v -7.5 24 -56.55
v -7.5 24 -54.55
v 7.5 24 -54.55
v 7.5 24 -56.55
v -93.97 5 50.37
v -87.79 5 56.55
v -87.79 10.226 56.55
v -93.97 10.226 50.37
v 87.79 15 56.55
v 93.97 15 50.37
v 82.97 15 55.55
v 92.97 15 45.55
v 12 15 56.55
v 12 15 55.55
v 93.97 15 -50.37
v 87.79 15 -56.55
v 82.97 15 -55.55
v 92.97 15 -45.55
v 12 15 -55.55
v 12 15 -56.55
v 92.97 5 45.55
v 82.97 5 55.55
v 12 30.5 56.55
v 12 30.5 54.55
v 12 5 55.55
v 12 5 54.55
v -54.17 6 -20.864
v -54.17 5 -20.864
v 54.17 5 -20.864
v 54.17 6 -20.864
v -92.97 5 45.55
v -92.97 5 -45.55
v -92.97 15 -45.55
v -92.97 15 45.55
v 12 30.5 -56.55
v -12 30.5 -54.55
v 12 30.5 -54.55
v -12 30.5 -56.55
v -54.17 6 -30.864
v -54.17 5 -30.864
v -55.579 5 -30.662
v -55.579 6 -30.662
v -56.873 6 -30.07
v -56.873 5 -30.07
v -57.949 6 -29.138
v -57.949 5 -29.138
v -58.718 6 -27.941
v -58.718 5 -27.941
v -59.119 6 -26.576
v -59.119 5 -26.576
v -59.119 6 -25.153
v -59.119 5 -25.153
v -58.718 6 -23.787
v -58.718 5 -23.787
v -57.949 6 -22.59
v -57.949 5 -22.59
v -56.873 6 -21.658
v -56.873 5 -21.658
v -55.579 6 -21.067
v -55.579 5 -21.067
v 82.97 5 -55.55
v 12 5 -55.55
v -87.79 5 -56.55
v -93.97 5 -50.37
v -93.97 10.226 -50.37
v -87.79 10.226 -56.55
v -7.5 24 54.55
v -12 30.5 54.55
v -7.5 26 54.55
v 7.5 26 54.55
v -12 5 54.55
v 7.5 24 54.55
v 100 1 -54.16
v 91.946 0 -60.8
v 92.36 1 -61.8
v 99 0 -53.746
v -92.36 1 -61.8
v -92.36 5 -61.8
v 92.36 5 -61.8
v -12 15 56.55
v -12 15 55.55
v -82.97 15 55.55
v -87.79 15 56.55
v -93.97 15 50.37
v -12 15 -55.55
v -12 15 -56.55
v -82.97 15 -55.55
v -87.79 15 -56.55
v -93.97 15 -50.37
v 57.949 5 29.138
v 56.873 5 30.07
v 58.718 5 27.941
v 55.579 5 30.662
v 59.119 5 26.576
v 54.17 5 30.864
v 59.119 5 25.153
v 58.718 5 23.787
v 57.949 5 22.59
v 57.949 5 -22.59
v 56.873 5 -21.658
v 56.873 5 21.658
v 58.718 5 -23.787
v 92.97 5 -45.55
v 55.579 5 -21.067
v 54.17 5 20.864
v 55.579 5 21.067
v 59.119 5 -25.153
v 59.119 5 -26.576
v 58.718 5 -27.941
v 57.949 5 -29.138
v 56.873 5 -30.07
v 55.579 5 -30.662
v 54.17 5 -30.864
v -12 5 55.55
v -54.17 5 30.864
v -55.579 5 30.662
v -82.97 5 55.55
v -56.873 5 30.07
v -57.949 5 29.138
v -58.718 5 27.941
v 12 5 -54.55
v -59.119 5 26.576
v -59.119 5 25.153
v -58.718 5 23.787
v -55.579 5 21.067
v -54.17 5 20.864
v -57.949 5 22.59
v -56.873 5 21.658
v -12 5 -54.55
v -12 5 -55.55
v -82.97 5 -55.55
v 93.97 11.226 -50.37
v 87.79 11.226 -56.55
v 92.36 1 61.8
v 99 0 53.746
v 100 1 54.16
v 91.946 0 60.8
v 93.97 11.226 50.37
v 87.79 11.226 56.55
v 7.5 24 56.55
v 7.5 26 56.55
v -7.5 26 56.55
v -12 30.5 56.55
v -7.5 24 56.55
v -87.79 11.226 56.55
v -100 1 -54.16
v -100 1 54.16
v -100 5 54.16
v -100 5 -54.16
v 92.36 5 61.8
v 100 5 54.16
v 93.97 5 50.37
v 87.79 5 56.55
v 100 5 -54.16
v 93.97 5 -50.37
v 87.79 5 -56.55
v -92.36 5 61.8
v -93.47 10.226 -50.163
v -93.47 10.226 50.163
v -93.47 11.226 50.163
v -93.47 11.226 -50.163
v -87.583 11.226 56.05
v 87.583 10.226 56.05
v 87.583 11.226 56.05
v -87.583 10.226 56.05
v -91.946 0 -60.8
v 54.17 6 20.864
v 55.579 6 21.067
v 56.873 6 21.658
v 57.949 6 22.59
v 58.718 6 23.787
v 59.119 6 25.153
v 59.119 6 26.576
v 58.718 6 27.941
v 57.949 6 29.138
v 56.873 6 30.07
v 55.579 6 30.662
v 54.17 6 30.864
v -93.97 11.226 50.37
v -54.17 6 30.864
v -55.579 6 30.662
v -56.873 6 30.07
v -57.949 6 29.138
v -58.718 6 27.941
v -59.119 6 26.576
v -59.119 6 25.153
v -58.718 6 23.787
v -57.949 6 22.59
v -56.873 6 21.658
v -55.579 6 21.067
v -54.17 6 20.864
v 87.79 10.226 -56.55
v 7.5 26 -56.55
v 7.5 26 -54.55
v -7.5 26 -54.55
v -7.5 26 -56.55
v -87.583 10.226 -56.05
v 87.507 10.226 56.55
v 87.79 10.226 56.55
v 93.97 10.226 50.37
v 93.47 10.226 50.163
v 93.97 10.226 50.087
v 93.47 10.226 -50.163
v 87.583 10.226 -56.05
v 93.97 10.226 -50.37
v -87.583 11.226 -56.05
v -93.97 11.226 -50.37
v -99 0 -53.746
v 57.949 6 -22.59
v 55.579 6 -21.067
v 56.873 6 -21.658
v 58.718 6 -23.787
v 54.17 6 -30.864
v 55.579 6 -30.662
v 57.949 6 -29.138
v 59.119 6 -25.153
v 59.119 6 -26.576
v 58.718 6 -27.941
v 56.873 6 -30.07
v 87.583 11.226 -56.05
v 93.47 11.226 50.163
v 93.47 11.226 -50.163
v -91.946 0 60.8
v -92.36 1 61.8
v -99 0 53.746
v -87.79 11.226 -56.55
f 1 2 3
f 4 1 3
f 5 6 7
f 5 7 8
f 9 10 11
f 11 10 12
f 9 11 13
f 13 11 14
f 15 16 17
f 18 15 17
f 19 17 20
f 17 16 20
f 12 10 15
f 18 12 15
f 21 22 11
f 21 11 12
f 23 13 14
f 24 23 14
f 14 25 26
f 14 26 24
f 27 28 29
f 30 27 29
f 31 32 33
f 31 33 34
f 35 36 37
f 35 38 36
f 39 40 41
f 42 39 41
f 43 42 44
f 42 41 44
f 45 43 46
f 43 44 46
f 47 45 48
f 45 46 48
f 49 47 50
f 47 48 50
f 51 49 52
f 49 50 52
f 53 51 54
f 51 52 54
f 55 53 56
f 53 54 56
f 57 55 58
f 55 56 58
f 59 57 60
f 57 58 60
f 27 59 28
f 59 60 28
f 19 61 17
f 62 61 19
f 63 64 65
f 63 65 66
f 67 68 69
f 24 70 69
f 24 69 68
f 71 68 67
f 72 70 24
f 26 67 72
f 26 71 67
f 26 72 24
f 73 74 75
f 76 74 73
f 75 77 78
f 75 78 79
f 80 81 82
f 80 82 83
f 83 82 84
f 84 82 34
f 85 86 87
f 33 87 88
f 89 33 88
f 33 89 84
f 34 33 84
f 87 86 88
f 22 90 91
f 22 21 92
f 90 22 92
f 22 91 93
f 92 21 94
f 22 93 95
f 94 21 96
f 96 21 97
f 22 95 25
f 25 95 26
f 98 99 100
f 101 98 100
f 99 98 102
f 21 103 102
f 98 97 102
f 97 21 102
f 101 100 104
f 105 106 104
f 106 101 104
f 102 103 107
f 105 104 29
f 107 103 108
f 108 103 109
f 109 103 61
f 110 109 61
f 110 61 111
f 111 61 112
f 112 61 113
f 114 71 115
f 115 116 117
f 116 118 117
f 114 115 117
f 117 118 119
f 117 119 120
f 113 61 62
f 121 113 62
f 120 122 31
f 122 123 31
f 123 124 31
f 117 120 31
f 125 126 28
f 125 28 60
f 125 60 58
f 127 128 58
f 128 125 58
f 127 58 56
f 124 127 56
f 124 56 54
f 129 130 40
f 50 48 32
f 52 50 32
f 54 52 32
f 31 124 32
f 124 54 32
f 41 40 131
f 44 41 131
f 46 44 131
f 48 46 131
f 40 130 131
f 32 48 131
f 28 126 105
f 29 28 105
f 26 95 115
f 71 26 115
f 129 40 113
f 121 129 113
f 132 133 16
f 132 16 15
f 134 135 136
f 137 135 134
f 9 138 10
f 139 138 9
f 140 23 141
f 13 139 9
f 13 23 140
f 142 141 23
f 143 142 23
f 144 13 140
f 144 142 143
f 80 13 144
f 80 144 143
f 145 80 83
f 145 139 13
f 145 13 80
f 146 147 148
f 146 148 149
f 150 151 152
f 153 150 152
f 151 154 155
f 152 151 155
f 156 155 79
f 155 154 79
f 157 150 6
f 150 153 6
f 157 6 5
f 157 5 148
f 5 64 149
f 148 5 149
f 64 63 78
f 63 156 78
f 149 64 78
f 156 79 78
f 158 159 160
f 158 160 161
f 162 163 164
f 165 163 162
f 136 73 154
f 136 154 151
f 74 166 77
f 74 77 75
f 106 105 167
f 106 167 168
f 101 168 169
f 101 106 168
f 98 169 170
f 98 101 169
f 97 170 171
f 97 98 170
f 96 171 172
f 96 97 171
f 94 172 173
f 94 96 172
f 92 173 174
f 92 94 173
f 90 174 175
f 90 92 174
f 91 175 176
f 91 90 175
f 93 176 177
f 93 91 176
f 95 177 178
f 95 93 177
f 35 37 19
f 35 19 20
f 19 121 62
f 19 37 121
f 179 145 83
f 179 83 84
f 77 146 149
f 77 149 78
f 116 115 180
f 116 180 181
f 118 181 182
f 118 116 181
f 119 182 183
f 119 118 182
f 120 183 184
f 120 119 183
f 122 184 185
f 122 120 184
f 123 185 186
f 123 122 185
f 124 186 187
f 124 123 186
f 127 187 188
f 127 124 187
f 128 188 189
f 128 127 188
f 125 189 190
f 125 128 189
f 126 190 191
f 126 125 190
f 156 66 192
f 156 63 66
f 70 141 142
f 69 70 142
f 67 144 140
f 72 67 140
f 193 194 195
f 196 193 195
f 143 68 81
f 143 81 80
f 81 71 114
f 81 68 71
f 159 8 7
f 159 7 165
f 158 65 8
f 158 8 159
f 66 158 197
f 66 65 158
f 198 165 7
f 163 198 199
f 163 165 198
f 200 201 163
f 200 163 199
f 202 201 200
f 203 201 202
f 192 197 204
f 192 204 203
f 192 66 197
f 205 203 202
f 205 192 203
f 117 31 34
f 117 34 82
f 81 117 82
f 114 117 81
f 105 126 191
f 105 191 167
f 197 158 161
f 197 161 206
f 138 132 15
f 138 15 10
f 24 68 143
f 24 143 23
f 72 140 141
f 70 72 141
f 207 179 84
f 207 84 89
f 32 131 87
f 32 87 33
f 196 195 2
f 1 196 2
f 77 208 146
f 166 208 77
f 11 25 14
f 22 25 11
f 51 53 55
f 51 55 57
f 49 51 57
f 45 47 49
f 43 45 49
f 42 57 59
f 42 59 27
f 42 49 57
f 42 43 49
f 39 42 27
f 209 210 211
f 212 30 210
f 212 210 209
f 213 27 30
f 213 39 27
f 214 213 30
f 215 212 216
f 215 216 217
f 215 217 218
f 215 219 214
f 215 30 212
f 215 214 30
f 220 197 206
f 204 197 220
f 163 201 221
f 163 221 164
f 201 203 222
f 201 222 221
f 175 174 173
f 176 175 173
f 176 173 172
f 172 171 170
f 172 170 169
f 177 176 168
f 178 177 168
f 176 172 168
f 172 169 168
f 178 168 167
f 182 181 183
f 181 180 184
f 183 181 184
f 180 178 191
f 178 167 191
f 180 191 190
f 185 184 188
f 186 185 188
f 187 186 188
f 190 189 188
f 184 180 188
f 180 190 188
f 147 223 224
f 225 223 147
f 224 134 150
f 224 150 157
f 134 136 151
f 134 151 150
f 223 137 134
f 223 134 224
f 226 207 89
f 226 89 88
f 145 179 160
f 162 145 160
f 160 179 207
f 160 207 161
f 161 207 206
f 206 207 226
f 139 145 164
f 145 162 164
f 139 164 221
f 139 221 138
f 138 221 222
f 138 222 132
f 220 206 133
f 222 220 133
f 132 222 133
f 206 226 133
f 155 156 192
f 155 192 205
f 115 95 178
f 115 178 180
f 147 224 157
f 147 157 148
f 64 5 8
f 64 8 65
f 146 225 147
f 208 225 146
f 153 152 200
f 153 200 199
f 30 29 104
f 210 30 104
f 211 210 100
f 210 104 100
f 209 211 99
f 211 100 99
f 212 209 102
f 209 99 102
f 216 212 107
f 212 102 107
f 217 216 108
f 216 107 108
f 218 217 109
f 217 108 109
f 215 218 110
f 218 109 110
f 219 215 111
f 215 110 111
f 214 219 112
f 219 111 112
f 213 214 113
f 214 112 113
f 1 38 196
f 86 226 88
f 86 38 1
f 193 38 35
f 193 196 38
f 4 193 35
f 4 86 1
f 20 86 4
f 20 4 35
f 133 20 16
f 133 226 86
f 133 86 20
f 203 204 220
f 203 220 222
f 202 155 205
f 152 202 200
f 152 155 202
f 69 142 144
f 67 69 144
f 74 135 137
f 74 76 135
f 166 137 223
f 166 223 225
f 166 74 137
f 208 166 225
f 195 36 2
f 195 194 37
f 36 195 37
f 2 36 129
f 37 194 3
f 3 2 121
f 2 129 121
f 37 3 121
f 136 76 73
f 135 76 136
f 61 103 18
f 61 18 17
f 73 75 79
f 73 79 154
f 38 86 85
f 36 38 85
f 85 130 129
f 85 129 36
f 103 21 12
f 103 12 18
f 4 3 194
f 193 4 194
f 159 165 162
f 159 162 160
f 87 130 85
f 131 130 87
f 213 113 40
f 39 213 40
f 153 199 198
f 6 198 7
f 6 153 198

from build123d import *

# Parameters (mm, degrees)
EXTRUDE_1_DEPTH     = 5
EXTRUDE_2_DEPTH     = 10
SKETCH_6_W          = 9.821902293
SKETCH_6_H          = 0.385172639
CUT_EXTRUDE_2_DEPTH = 0.2
SKETCH_7_W          = 24
SKETCH_7_H          = 1
EXTRUDE_6_DEPTH     = 25.5
CUT_EXTRUDE_3_DEPTH = 1
CUT_EXTRUDE_6_DEPTH = 117.5
EXTRUDE_7_DEPTH     = 1
CHAMFER_3_SIZE      = 1


with BuildPart() as part:
    # 草图1 → 凸台-拉伸1 (new body)
    with BuildSketch(Plane(origin=(0, 0, 0), x_dir=(1, 0, 0), z_dir=(0, 1, 0))):
        Polygon((-100, 54.16), (-92.36, 61.8), (92.36, 61.8), (100, 54.16), (100, -54.16), (92.36, -61.8), (-92.36, -61.8), (-100, -54.16), align=None)
    extrude(amount=EXTRUDE_1_DEPTH)

    # 草图2 → 凸台-拉伸2 (add)
    with BuildSketch(Plane(origin=(0, 5, 0), x_dir=(1, 0, 0), z_dir=(0, 1, 0))):
        Polygon((-93.97, 50.37), (-87.79, 56.55), (87.79, 56.55), (93.97, 50.37), (93.97, -50.37), (87.79, -56.55), (-87.79, -56.55), (-93.97, -50.37), align=None)
        Polygon((-92.97, -45.55), (-82.97, -55.55), (82.97, -55.55), (92.97, -45.55), (92.97, 45.55), (82.97, 55.55), (-82.97, 55.55), (-92.97, 45.55), align=None, mode=Mode.SUBTRACT)
    extrude(amount=EXTRUDE_2_DEPTH)

    # 草图6 → 切除-拉伸2 (cut)
    with BuildSketch(Plane(origin=(72.17, 0, 72.17), x_dir=(0.7071067811865479, 0, -0.7071067811865471), z_dir=(0.7071067811865471, 0, 0.7071067811865479))):
        with Locations((26.350211631, 10.419075461)):
            Rectangle(SKETCH_6_W, SKETCH_6_H)
    extrude(amount=-CUT_EXTRUDE_2_DEPTH, mode=Mode.SUBTRACT)

    # 草图7 → 凸台-拉伸6 (add)
    with BuildSketch(Plane(origin=(0, 5, 0), x_dir=(1, 0, 0), z_dir=(0, 1, 0))):
        with Locations((0, 55.05)):
            Rectangle(SKETCH_7_W, SKETCH_7_H)
        with Locations((0, 56.05)):
            Rectangle(SKETCH_7_W, SKETCH_7_H)
        with Locations((0, -55.05)):
            Rectangle(SKETCH_7_W, SKETCH_7_H)
        with Locations((0, -56.05)):
            Rectangle(SKETCH_7_W, SKETCH_7_H)
    extrude(amount=EXTRUDE_6_DEPTH)

    # 草图5 → 切除-拉伸3 (cut)
    with BuildSketch(Plane(origin=(0, 10.226489141, 0), x_dir=(1, 0, 0), z_dir=(0, 1, 0))):
        Polygon((-87.79, -56.55), (87.79, -56.55), (93.97, -50.37), (93.97, 50.37), (87.79, 56.55), (-87.79, 56.55), (-93.97, 50.37), (-93.97, -50.37), align=None)
        Polygon((87.582893219, 56.05), (93.47, 50.162893219), (93.47, -50.162893219), (87.582893219, -56.05), (-87.582893219, -56.05), (-93.47, -50.162893219), (-93.47, 50.162893219), (-87.582893219, 56.05), align=None, mode=Mode.SUBTRACT)
    extrude(amount=CUT_EXTRUDE_3_DEPTH, mode=Mode.SUBTRACT)

    # 草图13 → 切除-拉伸6 (cut)
    with BuildSketch(Plane.XY.offset(56.55)):
        Polygon((0, 24), (7.5, 24), (7.5, 26), (-7.5, 26), (-7.5, 24), align=None)
    extrude(amount=-CUT_EXTRUDE_6_DEPTH, mode=Mode.SUBTRACT)

    # 草图17 → 凸台-拉伸7 (add)
    with BuildSketch(Plane(origin=(0, 5, 0), x_dir=(1, 0, 0), z_dir=(0, 1, 0))):
        with BuildLine():
            Line((-54.17, -20.86418044), (54.17, -20.86418044))
            ThreePointArc((54.17, -20.86418044), (59.17, -25.86418044), (54.17, -30.86418044))
            Line((54.17, -30.86418044), (-54.17, -30.86418044))
            ThreePointArc((-54.17, -30.86418044), (-59.17, -25.86418044), (-54.17, -20.86418044))
        make_face()
        with BuildLine():
            Line((-54.17, 20.86418044), (54.17, 20.86418044))
            ThreePointArc((54.17, 20.86418044), (59.17, 25.86418044), (54.17, 30.86418044))
            Line((54.17, 30.86418044), (-54.17, 30.86418044))
            ThreePointArc((-54.17, 30.86418044), (-59.17, 25.86418044), (-54.17, 20.86418044))
        make_face()
    extrude(amount=EXTRUDE_7_DEPTH)

    # 倒角3
    chamfer_3_edges = [part.edges().sort_by_distance(p)[0] for p in [
        (96.18, 0, 57.98),
        (0, 0, 61.8),
        (-96.18, 0, 57.98),
        (-100, 0, 0),
        (-96.18, 0, -57.98),
        (0, 0, -61.8),
        (96.18, 0, -57.98),
        (100, 0, 0),
    ]]
    chamfer(chamfer_3_edges, length=CHAMFER_3_SIZE)


solid = part.part
